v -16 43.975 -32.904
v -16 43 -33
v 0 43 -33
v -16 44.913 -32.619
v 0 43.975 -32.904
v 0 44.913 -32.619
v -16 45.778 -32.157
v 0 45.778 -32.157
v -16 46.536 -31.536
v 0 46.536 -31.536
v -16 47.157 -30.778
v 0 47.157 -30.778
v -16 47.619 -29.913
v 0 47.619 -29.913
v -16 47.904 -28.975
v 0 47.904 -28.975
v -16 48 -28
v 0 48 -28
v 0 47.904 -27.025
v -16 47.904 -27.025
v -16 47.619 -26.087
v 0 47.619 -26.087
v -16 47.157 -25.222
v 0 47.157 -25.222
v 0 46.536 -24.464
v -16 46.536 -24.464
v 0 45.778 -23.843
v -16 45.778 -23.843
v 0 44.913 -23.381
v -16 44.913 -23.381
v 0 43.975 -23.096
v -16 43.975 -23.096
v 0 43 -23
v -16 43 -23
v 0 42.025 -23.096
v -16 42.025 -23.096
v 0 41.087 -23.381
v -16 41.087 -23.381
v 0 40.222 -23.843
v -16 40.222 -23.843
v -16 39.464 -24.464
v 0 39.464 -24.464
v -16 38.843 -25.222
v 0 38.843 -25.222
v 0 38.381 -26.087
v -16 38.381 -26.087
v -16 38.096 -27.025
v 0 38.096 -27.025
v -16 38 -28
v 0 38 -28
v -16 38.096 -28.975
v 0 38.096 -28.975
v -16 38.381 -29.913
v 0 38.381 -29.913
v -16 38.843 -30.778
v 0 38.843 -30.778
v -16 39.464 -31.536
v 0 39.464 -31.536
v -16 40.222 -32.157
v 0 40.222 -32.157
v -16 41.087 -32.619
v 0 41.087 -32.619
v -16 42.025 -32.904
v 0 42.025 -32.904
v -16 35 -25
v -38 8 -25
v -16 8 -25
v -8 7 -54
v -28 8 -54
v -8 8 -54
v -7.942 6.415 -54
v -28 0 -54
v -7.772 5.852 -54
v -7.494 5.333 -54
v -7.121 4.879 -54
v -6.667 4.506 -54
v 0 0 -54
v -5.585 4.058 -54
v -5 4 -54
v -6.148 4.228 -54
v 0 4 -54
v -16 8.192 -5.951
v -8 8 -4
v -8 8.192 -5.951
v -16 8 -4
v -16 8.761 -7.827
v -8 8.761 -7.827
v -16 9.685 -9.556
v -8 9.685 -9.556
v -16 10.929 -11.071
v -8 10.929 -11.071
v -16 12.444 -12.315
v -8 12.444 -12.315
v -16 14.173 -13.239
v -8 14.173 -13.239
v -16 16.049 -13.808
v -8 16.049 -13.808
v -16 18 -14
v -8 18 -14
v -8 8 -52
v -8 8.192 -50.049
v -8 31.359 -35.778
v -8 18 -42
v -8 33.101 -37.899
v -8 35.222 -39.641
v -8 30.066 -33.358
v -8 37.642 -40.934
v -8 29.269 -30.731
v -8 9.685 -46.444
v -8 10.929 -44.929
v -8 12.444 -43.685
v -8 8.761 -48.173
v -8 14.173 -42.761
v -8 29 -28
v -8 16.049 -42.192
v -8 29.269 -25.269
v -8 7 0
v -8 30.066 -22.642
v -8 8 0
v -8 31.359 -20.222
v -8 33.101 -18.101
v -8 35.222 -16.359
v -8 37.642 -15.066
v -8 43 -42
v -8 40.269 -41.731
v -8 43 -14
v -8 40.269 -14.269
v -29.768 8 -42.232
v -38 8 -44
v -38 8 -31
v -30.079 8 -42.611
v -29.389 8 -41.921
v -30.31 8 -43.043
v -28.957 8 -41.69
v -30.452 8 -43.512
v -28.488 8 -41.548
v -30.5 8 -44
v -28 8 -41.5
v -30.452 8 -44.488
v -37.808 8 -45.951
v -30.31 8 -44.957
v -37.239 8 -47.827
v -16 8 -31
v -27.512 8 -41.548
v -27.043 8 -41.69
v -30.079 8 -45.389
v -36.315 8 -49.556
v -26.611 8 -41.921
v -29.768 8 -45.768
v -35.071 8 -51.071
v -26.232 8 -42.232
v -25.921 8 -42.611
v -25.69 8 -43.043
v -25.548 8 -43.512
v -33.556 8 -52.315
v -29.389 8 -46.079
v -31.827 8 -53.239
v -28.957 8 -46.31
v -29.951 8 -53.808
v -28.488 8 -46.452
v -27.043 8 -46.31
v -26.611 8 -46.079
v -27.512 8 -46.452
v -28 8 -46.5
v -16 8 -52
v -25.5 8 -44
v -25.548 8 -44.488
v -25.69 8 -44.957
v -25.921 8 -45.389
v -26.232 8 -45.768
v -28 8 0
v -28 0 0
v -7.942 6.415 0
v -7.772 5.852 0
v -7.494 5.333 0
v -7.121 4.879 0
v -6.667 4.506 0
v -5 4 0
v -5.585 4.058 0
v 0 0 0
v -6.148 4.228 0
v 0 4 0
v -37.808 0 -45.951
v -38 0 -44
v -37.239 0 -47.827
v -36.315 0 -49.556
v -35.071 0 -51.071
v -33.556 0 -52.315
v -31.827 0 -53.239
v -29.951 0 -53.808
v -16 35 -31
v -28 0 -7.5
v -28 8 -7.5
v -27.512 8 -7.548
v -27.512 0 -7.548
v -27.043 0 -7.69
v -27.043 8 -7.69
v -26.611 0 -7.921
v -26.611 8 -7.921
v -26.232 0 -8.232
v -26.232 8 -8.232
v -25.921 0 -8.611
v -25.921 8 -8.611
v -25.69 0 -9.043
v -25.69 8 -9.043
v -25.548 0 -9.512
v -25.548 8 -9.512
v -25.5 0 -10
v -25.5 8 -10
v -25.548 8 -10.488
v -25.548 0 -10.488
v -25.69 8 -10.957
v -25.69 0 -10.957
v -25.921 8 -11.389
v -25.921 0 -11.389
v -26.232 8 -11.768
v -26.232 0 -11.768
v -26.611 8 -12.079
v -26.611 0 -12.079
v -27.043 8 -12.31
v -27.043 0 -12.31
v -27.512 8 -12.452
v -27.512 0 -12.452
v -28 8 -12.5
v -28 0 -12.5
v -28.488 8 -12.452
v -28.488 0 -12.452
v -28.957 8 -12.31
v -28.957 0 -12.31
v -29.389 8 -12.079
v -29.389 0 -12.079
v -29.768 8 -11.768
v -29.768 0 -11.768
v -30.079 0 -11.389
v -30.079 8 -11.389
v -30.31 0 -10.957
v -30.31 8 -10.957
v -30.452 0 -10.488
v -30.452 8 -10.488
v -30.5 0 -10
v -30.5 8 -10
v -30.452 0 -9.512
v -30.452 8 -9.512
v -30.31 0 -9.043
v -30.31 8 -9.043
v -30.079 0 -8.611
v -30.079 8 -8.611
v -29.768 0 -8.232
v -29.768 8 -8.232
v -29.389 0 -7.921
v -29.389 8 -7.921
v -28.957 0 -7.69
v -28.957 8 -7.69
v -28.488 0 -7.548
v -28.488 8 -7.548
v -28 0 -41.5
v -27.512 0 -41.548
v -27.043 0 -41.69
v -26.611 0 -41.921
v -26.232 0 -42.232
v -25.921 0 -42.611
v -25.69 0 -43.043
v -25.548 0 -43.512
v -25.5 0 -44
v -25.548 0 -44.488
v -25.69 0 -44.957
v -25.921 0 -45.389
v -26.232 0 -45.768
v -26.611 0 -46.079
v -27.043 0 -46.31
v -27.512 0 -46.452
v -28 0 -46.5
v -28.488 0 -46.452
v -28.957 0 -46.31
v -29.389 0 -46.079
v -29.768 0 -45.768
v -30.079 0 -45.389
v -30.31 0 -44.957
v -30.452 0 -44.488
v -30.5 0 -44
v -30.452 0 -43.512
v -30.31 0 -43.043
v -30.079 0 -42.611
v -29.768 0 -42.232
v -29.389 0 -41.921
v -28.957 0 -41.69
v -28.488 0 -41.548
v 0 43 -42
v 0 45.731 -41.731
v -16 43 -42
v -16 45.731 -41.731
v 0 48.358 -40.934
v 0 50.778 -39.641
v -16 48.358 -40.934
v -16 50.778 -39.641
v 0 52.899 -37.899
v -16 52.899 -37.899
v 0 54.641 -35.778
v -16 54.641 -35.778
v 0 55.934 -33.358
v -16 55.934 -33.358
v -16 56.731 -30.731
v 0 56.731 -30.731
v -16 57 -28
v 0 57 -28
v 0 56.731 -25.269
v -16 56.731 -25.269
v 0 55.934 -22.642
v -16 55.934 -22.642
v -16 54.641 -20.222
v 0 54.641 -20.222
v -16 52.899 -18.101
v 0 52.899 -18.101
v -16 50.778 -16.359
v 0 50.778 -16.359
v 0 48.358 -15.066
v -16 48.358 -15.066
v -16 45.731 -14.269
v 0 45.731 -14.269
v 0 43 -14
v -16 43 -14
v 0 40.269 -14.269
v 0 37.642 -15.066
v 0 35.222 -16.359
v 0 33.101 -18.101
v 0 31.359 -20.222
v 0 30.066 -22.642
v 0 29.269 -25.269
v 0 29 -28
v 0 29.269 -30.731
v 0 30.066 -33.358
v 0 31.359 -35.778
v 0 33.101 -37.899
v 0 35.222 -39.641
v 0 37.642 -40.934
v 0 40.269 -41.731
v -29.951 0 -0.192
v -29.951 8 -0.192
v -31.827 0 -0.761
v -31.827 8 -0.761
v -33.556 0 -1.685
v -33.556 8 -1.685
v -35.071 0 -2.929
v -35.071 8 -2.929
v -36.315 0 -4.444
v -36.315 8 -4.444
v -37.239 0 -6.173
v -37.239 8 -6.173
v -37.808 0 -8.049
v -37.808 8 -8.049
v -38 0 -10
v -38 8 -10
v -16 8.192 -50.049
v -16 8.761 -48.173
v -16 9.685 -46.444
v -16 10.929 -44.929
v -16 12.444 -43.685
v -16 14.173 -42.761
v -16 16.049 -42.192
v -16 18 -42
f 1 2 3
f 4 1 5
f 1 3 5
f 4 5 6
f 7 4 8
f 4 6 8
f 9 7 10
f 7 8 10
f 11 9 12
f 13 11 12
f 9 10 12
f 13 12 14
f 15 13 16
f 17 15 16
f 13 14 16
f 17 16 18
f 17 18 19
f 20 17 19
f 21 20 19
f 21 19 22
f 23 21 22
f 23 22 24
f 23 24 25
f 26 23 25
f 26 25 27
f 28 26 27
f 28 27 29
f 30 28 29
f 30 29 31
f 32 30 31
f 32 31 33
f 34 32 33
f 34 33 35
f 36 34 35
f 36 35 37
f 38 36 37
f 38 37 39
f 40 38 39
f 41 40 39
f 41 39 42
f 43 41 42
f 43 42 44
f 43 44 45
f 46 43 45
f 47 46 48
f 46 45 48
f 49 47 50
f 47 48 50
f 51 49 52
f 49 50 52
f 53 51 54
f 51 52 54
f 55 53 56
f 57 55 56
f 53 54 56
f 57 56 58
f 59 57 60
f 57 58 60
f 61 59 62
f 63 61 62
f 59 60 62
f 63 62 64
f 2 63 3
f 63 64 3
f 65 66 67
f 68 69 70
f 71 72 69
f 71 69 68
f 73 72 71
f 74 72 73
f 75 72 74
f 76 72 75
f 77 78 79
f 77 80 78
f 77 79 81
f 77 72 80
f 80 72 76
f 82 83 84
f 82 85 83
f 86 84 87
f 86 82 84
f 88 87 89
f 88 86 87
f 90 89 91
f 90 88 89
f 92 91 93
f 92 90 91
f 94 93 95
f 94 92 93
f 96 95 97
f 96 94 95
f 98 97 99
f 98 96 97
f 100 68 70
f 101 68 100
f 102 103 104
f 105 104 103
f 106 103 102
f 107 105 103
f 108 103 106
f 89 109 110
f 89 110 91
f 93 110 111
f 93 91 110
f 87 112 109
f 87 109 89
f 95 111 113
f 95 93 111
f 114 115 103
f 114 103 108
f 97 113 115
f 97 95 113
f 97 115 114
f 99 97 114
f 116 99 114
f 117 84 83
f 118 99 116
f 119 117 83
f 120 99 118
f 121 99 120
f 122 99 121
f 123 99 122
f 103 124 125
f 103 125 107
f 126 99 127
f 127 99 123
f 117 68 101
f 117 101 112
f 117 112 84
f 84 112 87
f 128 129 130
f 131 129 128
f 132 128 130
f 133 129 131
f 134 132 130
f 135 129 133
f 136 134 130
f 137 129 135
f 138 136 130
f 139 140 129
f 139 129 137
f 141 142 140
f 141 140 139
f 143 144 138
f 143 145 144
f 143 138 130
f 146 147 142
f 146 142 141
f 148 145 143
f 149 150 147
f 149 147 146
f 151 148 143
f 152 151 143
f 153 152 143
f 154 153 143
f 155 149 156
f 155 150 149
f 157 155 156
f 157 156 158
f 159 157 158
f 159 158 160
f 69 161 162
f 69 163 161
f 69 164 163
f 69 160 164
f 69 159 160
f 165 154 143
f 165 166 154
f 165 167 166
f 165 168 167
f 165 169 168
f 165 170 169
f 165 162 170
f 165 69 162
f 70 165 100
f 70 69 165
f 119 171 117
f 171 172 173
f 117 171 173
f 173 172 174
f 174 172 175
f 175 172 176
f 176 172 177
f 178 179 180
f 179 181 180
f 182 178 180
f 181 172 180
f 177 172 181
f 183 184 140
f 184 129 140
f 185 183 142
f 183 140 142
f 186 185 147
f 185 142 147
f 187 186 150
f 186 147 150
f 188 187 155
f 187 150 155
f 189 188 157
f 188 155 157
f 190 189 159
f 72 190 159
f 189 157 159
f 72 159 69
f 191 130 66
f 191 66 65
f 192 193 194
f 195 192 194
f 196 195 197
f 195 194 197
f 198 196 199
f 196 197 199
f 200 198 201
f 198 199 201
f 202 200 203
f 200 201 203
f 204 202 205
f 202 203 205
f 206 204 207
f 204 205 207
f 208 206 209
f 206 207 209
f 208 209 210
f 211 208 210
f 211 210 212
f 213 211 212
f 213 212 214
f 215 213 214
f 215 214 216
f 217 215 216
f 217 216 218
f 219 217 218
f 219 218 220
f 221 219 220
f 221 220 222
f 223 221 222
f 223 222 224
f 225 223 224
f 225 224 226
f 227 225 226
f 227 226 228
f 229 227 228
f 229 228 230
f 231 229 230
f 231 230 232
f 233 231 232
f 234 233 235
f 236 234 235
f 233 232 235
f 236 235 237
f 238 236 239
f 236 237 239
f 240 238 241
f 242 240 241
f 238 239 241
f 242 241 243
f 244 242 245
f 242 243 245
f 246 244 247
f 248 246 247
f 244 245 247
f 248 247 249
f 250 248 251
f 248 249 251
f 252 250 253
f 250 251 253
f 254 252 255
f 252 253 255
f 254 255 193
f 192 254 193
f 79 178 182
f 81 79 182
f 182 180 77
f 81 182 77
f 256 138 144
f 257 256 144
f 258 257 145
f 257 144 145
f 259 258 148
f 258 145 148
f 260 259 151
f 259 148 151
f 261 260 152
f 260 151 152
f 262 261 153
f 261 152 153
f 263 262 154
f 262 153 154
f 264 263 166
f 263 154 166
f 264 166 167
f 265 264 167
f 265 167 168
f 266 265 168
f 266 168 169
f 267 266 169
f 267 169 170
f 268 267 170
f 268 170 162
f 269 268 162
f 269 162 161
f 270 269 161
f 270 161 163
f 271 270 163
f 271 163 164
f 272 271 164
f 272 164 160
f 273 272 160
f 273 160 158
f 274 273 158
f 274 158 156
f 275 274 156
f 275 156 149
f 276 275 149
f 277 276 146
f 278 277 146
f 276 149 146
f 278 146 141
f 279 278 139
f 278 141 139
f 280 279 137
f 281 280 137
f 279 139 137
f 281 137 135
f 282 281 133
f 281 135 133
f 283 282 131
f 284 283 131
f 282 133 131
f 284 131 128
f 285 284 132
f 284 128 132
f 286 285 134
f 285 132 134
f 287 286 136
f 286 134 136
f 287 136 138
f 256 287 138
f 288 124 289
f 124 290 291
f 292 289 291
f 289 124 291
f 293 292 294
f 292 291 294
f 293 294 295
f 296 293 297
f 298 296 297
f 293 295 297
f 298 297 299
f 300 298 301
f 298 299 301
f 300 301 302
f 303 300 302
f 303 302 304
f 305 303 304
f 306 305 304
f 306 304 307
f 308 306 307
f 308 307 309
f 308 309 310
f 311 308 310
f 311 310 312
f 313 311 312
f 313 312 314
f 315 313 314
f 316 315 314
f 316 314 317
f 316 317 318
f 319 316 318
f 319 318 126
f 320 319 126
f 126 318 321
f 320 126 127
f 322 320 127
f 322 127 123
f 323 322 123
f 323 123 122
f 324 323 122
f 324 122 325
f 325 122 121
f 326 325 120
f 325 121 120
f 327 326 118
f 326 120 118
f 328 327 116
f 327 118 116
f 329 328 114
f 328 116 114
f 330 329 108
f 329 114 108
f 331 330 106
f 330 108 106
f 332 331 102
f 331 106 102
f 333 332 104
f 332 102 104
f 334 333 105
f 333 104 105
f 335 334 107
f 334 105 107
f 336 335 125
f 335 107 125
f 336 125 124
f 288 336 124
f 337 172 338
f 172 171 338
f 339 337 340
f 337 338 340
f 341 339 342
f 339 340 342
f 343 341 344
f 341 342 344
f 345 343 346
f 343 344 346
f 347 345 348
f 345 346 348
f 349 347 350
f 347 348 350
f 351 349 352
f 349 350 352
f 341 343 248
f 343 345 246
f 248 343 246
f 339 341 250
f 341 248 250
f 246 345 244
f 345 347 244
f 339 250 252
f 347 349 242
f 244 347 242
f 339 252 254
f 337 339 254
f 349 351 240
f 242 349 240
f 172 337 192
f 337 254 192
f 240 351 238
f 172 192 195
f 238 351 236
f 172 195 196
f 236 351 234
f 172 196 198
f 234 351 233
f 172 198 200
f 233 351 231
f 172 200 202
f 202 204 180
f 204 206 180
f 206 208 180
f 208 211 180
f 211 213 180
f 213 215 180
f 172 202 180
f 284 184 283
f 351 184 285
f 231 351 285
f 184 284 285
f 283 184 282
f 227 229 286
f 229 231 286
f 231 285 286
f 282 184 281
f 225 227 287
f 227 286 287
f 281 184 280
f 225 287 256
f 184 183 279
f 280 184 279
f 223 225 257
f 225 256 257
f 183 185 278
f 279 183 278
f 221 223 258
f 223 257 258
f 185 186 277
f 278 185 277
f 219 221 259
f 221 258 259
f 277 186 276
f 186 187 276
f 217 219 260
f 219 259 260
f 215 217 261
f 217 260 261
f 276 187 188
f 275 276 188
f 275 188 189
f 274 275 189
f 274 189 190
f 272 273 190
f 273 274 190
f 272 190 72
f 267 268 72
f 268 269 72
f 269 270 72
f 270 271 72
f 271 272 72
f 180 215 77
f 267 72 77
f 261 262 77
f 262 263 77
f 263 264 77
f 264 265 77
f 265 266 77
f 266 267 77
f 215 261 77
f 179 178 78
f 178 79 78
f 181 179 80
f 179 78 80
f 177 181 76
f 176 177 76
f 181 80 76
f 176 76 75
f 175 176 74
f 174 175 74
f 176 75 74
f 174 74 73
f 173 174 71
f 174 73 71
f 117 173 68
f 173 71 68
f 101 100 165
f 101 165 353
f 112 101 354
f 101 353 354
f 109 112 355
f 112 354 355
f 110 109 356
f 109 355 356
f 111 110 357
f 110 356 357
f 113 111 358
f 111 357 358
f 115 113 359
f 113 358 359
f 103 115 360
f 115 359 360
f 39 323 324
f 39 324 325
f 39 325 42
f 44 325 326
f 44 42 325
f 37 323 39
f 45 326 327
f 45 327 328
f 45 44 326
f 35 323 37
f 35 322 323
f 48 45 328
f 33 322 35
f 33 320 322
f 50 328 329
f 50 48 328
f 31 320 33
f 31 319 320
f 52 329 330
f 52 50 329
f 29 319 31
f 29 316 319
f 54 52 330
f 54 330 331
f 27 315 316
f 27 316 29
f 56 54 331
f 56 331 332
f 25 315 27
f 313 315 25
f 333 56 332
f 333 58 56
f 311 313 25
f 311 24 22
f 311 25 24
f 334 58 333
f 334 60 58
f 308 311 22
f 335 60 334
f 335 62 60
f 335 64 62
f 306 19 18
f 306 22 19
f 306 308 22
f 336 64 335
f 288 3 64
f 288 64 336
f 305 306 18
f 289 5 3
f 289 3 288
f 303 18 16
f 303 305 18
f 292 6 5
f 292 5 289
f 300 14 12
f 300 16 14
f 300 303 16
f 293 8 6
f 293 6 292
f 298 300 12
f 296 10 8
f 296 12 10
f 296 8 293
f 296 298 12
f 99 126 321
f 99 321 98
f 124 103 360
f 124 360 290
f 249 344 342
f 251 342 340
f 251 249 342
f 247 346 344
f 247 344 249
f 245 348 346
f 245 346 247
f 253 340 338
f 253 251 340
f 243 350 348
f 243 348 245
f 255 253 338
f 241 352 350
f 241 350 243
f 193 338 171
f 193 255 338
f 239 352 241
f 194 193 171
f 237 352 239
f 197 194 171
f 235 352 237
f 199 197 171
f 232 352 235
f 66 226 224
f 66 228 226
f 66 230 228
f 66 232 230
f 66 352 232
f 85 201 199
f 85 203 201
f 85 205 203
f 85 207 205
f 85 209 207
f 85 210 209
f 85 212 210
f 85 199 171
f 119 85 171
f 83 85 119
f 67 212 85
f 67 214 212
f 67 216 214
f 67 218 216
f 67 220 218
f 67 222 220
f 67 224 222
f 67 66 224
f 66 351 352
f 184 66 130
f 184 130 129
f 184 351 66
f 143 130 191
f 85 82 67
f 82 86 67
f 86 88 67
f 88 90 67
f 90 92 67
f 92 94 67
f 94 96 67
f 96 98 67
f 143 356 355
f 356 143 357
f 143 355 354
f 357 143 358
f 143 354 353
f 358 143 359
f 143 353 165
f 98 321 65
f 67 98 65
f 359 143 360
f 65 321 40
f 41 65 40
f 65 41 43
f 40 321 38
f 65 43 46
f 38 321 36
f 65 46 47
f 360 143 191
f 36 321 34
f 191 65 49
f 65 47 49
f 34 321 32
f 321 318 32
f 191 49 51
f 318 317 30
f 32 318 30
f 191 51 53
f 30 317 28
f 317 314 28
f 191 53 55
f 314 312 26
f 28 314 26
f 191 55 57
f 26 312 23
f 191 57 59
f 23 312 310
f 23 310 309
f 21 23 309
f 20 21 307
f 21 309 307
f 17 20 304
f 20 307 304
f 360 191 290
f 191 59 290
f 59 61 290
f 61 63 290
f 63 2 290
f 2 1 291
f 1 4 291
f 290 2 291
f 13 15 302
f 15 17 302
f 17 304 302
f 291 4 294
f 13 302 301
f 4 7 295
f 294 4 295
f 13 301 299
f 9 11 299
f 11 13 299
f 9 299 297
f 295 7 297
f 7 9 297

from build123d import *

# Parameters (mm, degrees)
IZIM1_W                     = 38
IZIM1_H                     = 54
Y_KSEKLIK_EKSTR_ZYON1_DEPTH = 8
IZIM2_W                     = 8
IZIM2_H                     = 4
KES_EKSTR_ZYON1_DEPTH       = 67.513156593
RADYUS1_R                   = 3
RADYUS2_R                   = 10
IZIM4_R                     = 2.5
KES_EKSTR_ZYON2_DEPTH       = 67.513156593
Y_KSEKLIK_EKSTR_ZYON2_DEPTH = 8
RADYUS3_R                   = 10
IZIM6_R                     = 14
Y_KSEKLIK_EKSTR_ZYON3_DEPTH = 8
IZIM7_R                     = 5
KES_EKSTR_ZYON3_DEPTH       = 88.229582138
FEDER2_REACH                = 76.007
IZIM8_WALL_W                = 184.841662432
IZIM8_WALL_H                = 6


with BuildPart() as part:
    # Çizim1 → Yükseklik-Ekstrüzyon1 (new body)
    with BuildSketch(Plane(origin=(0, 0, 0), x_dir=(1, 0, 0), z_dir=(0, 1, 0))):
        with Locations((-19, 27)):
            Rectangle(IZIM1_W, IZIM1_H)
    extrude(amount=Y_KSEKLIK_EKSTR_ZYON1_DEPTH)

    # Çizim2 → Kes-Ekstrüzyon1 (cut, through all)
    with BuildSketch(Plane.XY):
        with Locations((-4, 6)):
            Rectangle(IZIM2_W, IZIM2_H)
    extrude(amount=-KES_EKSTR_ZYON1_DEPTH, mode=Mode.SUBTRACT)

    # Radyus1
    radyus1_edges = [part.edges().sort_by_distance(p)[0] for p in [
        (-8, 4, -27),
    ]]
    fillet(radyus1_edges, radius=RADYUS1_R)

    # Radyus2
    radyus2_edges = [part.edges().sort_by_distance(p)[0] for p in [
        (-38, 4, 0),
        (-38, 4, -54),
    ]]
    fillet(radyus2_edges, radius=RADYUS2_R)

    # Çizim4 → Kes-Ekstrüzyon2 (cut, through all)
    with BuildSketch(Plane(origin=(0, 8, 0), x_dir=(1, 0, 0), z_dir=(0, 1, 0))):
        with Locations(Location((-28, 44, 0), (0, 0, 270))):
            Circle(IZIM4_R)
        with Locations(Location((-28, 10, 0), (0, 0, 270))):
            Circle(IZIM4_R)
    extrude(amount=-KES_EKSTR_ZYON2_DEPTH, mode=Mode.SUBTRACT)

    # Çizim5 → Yükseklik-Ekstrüzyon2 (add)
    with BuildSketch(Plane(origin=(-8, 0, 0), x_dir=(0, 0, -1), z_dir=(1, 0, 0))):
        with BuildLine():
            Line((14, 43), (14, 8))
            Line((14, 8), (42, 8))
            Line((42, 8), (42, 43))
            ThreePointArc((42, 43), (28, 57), (14, 43))
        make_face()
    extrude(amount=-Y_KSEKLIK_EKSTR_ZYON2_DEPTH)

    # Radyus3
    radyus3_edges = [part.edges().sort_by_distance(p)[0] for p in [
        (-12, 8, -42),
        (-12, 8, -14),
    ]]
    fillet(radyus3_edges, radius=RADYUS3_R)

    # Çizim6 → Yükseklik-Ekstrüzyon3 (add)
    with BuildSketch(Plane(origin=(-8, 0, 0), x_dir=(0, 0, -1), z_dir=(1, 0, 0))):
        with Locations((28, 43)):
            Circle(IZIM6_R)
    extrude(amount=Y_KSEKLIK_EKSTR_ZYON3_DEPTH)

    # Çizim7 → Kes-Ekstrüzyon3 (cut, through all)
    with BuildSketch(Plane(origin=(0, 0, 0), x_dir=(0, 0, -1), z_dir=(1, 0, 0))):
        with Locations((28, 43)):
            Circle(IZIM7_R)
    extrude(amount=-KES_EKSTR_ZYON3_DEPTH, mode=Mode.SUBTRACT)

    # Çizim8 wall → Feder2 (add, up to next)
    with BuildSketch(Plane(origin=(-27, 21.5, -28), x_dir=(0.631672951162, 0.775234985517, 0), z_dir=(-0.775234985517, 0.631672951162, 0)), mode=Mode.PRIVATE) as feder2_sk1:
        Rectangle(IZIM8_WALL_W, IZIM8_WALL_H)
    feder2_tool1 = extrude(feder2_sk1.sketch, amount=-FEDER2_REACH, mode=Mode.PRIVATE) - part.part
    add(feder2_tool1.solids().sort_by_distance((-27, 21.5, -28))[0])


solid = part.part
